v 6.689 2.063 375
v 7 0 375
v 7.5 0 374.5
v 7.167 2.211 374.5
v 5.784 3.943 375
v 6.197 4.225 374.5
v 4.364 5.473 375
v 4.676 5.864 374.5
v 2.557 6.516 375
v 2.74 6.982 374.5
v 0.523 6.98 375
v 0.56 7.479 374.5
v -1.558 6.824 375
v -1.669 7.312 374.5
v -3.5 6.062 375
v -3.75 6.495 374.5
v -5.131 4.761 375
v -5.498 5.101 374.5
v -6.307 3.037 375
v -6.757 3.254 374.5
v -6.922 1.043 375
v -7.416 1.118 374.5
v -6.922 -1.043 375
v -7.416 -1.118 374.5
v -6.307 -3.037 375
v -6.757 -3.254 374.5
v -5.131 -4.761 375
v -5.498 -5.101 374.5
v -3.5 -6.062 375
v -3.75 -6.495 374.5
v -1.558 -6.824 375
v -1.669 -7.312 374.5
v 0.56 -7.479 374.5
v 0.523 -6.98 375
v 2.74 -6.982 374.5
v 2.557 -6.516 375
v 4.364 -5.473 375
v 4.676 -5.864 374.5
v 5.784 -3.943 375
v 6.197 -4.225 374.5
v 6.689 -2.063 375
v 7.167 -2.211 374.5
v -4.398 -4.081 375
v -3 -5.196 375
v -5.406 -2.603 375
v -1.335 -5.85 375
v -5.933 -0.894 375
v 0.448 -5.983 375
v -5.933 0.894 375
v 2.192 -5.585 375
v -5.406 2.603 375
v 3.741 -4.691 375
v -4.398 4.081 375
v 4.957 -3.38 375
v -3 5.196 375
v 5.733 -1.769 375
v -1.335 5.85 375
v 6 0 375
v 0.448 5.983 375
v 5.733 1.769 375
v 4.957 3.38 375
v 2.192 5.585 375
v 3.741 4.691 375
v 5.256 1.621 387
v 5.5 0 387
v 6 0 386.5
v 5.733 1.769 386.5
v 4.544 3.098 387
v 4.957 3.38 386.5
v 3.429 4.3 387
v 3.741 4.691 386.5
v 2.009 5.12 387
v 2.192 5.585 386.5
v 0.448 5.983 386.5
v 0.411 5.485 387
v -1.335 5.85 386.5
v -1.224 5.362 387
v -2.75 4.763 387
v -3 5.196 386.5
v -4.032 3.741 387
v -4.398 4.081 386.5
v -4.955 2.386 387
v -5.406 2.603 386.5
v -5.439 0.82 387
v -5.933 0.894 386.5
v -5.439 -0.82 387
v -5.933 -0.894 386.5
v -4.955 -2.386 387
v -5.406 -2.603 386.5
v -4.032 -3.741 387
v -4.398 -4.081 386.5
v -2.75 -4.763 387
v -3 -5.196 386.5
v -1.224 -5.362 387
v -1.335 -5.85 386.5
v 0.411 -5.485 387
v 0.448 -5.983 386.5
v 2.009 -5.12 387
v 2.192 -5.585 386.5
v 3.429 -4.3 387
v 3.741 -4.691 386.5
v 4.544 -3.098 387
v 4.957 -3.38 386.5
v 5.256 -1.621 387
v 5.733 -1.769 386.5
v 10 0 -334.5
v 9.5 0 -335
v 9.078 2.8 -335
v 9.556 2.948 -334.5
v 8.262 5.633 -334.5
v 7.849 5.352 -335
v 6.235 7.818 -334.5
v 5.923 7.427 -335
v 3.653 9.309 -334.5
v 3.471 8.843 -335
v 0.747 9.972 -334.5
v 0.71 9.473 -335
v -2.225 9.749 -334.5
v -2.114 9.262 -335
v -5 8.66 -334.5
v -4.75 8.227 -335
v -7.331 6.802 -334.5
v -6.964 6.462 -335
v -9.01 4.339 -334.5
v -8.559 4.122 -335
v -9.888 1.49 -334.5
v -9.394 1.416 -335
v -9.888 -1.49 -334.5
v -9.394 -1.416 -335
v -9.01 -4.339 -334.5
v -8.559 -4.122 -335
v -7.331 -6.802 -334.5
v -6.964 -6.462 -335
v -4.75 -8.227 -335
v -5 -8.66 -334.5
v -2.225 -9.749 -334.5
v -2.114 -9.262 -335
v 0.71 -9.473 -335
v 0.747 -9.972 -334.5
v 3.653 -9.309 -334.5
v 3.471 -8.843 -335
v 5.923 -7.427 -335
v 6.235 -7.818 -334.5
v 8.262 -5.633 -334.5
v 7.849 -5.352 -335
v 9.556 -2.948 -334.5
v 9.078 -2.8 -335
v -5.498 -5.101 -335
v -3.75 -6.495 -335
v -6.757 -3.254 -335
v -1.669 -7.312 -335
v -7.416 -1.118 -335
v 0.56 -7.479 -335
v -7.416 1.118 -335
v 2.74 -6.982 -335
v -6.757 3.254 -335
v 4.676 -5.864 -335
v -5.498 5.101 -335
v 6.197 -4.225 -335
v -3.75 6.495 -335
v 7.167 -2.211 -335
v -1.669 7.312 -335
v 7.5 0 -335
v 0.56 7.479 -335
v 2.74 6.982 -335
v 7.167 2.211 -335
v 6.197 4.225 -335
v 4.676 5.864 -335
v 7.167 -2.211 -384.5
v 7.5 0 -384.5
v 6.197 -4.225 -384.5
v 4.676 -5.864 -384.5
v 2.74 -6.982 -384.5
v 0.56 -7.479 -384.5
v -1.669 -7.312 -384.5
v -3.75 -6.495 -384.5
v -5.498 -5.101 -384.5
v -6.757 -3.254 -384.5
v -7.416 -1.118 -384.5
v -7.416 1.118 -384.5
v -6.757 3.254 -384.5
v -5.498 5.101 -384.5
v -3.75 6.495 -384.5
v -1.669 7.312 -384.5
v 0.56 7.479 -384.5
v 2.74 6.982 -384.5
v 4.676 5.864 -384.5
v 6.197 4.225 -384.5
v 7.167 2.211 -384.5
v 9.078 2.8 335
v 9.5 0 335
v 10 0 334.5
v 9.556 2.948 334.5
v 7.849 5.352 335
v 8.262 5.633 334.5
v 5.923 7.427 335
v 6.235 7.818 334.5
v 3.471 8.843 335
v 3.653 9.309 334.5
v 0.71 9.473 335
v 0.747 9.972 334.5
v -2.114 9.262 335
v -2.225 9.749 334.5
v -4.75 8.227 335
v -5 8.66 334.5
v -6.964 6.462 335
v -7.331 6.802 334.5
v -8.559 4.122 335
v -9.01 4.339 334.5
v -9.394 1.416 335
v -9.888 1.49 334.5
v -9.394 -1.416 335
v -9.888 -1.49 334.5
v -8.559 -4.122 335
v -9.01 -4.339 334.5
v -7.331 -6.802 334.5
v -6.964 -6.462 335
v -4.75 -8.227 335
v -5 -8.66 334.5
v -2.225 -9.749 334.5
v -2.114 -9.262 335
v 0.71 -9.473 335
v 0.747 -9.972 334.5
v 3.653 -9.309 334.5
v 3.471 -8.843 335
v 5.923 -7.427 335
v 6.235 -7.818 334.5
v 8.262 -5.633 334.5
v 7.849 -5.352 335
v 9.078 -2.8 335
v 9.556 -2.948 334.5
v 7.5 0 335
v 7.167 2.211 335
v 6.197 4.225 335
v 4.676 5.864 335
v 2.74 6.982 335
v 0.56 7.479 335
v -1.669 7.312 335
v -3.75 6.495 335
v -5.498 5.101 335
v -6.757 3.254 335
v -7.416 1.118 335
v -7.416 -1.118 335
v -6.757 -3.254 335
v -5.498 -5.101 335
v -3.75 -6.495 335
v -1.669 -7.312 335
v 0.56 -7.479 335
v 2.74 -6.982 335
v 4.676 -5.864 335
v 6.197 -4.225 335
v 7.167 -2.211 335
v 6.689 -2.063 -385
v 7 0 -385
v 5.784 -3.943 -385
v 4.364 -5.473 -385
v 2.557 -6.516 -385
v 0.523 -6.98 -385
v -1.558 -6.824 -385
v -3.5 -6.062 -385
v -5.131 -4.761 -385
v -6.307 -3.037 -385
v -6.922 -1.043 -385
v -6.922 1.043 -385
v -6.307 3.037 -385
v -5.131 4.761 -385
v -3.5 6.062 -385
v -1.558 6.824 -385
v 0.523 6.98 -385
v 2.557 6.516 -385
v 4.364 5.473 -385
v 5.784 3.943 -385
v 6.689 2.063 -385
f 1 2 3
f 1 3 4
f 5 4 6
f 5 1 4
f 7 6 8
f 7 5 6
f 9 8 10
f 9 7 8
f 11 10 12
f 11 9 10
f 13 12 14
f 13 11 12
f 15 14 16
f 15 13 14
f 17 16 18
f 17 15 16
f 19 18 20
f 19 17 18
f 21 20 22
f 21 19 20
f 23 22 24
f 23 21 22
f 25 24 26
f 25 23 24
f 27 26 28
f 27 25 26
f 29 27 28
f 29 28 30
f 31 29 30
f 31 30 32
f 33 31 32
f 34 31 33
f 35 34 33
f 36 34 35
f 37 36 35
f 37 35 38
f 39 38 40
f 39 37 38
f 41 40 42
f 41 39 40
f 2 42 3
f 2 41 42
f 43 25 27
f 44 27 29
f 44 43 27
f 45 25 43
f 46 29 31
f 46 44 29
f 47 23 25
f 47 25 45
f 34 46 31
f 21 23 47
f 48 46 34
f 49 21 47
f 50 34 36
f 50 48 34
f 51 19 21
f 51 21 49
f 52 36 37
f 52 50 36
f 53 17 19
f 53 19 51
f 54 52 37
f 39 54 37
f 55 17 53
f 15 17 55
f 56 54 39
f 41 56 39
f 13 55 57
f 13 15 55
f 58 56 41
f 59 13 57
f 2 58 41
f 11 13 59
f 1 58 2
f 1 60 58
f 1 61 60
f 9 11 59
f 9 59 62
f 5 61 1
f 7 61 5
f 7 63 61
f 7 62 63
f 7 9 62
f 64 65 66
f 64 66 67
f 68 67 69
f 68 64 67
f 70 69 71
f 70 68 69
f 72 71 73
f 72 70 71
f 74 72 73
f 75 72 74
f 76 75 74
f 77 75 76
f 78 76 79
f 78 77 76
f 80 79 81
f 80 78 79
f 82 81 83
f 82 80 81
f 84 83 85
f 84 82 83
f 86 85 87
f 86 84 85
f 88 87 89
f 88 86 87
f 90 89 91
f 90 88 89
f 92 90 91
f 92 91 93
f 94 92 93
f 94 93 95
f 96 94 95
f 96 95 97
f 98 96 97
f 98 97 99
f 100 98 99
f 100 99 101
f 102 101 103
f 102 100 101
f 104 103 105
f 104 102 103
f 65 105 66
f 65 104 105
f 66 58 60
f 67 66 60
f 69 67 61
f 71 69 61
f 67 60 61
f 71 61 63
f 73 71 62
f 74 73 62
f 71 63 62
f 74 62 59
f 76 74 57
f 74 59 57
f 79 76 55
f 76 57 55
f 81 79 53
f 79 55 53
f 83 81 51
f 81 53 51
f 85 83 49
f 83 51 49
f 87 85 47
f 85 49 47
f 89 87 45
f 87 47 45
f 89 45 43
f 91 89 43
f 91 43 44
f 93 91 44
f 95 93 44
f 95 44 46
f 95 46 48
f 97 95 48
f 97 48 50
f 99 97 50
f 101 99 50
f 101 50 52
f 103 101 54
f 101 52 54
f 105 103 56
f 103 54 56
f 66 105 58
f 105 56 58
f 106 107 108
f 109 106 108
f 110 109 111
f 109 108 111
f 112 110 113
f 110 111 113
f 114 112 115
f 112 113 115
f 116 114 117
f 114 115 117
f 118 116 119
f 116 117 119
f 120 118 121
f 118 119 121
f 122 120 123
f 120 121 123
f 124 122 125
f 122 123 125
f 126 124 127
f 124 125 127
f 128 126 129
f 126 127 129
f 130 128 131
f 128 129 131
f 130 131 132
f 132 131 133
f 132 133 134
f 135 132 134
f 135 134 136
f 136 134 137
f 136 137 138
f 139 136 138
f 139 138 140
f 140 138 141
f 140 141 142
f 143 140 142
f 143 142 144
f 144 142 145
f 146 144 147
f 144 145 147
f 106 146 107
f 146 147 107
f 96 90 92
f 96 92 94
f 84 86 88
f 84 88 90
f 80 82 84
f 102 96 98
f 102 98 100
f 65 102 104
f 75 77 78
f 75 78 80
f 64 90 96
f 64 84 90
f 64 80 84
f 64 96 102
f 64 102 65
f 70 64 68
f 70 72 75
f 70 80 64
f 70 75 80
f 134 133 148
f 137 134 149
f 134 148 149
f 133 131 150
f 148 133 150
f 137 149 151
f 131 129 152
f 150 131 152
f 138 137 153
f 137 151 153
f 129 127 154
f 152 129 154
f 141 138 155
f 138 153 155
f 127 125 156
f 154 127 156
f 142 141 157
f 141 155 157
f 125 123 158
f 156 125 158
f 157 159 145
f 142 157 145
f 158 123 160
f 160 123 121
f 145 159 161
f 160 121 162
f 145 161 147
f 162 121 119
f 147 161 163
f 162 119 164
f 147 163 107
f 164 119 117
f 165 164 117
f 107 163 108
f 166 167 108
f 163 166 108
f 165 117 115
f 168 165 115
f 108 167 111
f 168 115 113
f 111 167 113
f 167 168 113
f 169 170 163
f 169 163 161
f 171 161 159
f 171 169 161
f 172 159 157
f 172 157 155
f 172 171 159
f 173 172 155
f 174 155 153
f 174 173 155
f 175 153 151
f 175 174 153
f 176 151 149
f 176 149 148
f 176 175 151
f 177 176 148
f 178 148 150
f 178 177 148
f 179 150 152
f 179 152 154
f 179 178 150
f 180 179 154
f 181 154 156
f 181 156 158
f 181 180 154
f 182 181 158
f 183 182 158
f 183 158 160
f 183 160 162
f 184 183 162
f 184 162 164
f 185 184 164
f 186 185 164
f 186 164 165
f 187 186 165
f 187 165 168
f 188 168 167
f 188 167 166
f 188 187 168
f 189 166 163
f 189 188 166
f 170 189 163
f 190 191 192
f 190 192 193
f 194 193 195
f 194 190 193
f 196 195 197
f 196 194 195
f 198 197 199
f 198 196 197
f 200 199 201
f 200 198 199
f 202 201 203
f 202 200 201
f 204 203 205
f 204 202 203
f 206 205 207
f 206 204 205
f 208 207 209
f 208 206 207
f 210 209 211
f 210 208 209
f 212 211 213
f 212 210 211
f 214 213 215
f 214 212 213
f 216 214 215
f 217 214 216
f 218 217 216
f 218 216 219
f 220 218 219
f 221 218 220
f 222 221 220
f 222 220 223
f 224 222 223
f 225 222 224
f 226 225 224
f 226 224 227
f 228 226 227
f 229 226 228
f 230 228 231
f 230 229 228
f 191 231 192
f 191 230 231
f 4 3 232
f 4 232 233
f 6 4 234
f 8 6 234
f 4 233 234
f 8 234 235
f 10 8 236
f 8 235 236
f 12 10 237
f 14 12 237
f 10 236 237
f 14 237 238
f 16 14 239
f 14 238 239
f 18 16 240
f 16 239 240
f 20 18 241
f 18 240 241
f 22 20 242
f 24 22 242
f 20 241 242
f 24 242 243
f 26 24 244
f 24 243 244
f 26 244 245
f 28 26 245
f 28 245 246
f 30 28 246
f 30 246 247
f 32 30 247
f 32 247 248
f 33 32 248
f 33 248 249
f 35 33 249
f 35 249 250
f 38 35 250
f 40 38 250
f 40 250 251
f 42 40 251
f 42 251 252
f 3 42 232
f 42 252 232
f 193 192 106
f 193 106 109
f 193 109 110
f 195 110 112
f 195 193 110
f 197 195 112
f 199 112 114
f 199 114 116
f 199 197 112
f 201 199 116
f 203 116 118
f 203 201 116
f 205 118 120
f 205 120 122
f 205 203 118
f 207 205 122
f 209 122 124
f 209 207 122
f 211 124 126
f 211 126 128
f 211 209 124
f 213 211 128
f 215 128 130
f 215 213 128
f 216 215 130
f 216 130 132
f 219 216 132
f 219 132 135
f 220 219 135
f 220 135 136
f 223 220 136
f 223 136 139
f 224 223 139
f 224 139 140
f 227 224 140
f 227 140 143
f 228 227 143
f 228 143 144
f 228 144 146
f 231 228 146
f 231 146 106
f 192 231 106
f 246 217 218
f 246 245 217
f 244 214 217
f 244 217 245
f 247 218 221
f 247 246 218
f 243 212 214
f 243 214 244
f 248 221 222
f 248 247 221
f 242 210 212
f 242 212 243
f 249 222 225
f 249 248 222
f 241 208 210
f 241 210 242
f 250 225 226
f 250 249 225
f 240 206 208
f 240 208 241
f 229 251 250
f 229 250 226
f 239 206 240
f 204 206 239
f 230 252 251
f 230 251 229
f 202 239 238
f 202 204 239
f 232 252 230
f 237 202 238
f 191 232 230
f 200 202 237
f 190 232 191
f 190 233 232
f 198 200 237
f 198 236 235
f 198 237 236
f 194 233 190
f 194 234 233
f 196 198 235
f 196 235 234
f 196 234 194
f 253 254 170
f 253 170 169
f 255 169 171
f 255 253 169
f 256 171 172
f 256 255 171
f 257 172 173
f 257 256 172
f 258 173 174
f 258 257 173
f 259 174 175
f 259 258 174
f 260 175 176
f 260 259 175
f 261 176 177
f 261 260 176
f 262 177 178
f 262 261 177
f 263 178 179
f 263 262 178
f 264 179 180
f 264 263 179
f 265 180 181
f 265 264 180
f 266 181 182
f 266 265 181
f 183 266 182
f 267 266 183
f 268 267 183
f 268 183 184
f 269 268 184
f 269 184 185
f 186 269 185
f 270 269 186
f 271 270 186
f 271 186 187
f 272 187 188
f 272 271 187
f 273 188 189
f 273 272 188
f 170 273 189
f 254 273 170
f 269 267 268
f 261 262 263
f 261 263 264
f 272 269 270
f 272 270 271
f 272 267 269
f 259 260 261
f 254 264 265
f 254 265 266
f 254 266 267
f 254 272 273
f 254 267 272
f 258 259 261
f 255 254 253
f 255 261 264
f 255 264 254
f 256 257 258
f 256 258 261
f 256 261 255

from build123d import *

# Parameters (mm, degrees)
SKETCH1_R           = 10
BOSS_EXTRUDE1_DEPTH = 335
SKETCH4_R           = 7.5
BOSS_EXTRUDE2_DEPTH = 40
SKETCH5_R           = 6
BOSS_EXTRUDE3_DEPTH = 12
BOSS_EXTRUDE5_START = 50
SKETCH11_R          = 7.5
BOSS_EXTRUDE5_DEPTH = 50
CHAMFER2_SIZE       = 0.5


with BuildPart() as part:
    # Sketch1 → Boss-Extrude1 (new, symmetric)
    with BuildSketch(Plane.XY):
        Circle(SKETCH1_R)
    extrude(amount=BOSS_EXTRUDE1_DEPTH, both=True)

    # Sketch4 → Boss-Extrude2 (add)
    with BuildSketch(Plane.XY.offset(335)):
        Circle(SKETCH4_R)
    extrude(amount=BOSS_EXTRUDE2_DEPTH)

    # Sketch5 → Boss-Extrude3 (add)
    with BuildSketch(Plane.XY.offset(375)):
        Circle(SKETCH5_R)
    extrude(amount=BOSS_EXTRUDE3_DEPTH)

    # Sketch11 → Boss-Extrude5 (add)
    with BuildSketch(Plane(origin=(0, 0, -335), x_dir=(-1, 0, 0), z_dir=(0, 0, -1)).offset(BOSS_EXTRUDE5_START)):
        Circle(SKETCH11_R)
    extrude(amount=-BOSS_EXTRUDE5_DEPTH)

    # Chamfer2
    chamfer2_edges = [part.edges().sort_by_distance(p)[0] for p in [
        (7.5, 0, -385),
        (-6, 0, 387),
        (-10, 0, -335),
        (-7.5, 0, 375),
        (-10, 0, 335),
    ]]
    chamfer(chamfer2_edges, length=CHAMFER2_SIZE)


solid = part.part
